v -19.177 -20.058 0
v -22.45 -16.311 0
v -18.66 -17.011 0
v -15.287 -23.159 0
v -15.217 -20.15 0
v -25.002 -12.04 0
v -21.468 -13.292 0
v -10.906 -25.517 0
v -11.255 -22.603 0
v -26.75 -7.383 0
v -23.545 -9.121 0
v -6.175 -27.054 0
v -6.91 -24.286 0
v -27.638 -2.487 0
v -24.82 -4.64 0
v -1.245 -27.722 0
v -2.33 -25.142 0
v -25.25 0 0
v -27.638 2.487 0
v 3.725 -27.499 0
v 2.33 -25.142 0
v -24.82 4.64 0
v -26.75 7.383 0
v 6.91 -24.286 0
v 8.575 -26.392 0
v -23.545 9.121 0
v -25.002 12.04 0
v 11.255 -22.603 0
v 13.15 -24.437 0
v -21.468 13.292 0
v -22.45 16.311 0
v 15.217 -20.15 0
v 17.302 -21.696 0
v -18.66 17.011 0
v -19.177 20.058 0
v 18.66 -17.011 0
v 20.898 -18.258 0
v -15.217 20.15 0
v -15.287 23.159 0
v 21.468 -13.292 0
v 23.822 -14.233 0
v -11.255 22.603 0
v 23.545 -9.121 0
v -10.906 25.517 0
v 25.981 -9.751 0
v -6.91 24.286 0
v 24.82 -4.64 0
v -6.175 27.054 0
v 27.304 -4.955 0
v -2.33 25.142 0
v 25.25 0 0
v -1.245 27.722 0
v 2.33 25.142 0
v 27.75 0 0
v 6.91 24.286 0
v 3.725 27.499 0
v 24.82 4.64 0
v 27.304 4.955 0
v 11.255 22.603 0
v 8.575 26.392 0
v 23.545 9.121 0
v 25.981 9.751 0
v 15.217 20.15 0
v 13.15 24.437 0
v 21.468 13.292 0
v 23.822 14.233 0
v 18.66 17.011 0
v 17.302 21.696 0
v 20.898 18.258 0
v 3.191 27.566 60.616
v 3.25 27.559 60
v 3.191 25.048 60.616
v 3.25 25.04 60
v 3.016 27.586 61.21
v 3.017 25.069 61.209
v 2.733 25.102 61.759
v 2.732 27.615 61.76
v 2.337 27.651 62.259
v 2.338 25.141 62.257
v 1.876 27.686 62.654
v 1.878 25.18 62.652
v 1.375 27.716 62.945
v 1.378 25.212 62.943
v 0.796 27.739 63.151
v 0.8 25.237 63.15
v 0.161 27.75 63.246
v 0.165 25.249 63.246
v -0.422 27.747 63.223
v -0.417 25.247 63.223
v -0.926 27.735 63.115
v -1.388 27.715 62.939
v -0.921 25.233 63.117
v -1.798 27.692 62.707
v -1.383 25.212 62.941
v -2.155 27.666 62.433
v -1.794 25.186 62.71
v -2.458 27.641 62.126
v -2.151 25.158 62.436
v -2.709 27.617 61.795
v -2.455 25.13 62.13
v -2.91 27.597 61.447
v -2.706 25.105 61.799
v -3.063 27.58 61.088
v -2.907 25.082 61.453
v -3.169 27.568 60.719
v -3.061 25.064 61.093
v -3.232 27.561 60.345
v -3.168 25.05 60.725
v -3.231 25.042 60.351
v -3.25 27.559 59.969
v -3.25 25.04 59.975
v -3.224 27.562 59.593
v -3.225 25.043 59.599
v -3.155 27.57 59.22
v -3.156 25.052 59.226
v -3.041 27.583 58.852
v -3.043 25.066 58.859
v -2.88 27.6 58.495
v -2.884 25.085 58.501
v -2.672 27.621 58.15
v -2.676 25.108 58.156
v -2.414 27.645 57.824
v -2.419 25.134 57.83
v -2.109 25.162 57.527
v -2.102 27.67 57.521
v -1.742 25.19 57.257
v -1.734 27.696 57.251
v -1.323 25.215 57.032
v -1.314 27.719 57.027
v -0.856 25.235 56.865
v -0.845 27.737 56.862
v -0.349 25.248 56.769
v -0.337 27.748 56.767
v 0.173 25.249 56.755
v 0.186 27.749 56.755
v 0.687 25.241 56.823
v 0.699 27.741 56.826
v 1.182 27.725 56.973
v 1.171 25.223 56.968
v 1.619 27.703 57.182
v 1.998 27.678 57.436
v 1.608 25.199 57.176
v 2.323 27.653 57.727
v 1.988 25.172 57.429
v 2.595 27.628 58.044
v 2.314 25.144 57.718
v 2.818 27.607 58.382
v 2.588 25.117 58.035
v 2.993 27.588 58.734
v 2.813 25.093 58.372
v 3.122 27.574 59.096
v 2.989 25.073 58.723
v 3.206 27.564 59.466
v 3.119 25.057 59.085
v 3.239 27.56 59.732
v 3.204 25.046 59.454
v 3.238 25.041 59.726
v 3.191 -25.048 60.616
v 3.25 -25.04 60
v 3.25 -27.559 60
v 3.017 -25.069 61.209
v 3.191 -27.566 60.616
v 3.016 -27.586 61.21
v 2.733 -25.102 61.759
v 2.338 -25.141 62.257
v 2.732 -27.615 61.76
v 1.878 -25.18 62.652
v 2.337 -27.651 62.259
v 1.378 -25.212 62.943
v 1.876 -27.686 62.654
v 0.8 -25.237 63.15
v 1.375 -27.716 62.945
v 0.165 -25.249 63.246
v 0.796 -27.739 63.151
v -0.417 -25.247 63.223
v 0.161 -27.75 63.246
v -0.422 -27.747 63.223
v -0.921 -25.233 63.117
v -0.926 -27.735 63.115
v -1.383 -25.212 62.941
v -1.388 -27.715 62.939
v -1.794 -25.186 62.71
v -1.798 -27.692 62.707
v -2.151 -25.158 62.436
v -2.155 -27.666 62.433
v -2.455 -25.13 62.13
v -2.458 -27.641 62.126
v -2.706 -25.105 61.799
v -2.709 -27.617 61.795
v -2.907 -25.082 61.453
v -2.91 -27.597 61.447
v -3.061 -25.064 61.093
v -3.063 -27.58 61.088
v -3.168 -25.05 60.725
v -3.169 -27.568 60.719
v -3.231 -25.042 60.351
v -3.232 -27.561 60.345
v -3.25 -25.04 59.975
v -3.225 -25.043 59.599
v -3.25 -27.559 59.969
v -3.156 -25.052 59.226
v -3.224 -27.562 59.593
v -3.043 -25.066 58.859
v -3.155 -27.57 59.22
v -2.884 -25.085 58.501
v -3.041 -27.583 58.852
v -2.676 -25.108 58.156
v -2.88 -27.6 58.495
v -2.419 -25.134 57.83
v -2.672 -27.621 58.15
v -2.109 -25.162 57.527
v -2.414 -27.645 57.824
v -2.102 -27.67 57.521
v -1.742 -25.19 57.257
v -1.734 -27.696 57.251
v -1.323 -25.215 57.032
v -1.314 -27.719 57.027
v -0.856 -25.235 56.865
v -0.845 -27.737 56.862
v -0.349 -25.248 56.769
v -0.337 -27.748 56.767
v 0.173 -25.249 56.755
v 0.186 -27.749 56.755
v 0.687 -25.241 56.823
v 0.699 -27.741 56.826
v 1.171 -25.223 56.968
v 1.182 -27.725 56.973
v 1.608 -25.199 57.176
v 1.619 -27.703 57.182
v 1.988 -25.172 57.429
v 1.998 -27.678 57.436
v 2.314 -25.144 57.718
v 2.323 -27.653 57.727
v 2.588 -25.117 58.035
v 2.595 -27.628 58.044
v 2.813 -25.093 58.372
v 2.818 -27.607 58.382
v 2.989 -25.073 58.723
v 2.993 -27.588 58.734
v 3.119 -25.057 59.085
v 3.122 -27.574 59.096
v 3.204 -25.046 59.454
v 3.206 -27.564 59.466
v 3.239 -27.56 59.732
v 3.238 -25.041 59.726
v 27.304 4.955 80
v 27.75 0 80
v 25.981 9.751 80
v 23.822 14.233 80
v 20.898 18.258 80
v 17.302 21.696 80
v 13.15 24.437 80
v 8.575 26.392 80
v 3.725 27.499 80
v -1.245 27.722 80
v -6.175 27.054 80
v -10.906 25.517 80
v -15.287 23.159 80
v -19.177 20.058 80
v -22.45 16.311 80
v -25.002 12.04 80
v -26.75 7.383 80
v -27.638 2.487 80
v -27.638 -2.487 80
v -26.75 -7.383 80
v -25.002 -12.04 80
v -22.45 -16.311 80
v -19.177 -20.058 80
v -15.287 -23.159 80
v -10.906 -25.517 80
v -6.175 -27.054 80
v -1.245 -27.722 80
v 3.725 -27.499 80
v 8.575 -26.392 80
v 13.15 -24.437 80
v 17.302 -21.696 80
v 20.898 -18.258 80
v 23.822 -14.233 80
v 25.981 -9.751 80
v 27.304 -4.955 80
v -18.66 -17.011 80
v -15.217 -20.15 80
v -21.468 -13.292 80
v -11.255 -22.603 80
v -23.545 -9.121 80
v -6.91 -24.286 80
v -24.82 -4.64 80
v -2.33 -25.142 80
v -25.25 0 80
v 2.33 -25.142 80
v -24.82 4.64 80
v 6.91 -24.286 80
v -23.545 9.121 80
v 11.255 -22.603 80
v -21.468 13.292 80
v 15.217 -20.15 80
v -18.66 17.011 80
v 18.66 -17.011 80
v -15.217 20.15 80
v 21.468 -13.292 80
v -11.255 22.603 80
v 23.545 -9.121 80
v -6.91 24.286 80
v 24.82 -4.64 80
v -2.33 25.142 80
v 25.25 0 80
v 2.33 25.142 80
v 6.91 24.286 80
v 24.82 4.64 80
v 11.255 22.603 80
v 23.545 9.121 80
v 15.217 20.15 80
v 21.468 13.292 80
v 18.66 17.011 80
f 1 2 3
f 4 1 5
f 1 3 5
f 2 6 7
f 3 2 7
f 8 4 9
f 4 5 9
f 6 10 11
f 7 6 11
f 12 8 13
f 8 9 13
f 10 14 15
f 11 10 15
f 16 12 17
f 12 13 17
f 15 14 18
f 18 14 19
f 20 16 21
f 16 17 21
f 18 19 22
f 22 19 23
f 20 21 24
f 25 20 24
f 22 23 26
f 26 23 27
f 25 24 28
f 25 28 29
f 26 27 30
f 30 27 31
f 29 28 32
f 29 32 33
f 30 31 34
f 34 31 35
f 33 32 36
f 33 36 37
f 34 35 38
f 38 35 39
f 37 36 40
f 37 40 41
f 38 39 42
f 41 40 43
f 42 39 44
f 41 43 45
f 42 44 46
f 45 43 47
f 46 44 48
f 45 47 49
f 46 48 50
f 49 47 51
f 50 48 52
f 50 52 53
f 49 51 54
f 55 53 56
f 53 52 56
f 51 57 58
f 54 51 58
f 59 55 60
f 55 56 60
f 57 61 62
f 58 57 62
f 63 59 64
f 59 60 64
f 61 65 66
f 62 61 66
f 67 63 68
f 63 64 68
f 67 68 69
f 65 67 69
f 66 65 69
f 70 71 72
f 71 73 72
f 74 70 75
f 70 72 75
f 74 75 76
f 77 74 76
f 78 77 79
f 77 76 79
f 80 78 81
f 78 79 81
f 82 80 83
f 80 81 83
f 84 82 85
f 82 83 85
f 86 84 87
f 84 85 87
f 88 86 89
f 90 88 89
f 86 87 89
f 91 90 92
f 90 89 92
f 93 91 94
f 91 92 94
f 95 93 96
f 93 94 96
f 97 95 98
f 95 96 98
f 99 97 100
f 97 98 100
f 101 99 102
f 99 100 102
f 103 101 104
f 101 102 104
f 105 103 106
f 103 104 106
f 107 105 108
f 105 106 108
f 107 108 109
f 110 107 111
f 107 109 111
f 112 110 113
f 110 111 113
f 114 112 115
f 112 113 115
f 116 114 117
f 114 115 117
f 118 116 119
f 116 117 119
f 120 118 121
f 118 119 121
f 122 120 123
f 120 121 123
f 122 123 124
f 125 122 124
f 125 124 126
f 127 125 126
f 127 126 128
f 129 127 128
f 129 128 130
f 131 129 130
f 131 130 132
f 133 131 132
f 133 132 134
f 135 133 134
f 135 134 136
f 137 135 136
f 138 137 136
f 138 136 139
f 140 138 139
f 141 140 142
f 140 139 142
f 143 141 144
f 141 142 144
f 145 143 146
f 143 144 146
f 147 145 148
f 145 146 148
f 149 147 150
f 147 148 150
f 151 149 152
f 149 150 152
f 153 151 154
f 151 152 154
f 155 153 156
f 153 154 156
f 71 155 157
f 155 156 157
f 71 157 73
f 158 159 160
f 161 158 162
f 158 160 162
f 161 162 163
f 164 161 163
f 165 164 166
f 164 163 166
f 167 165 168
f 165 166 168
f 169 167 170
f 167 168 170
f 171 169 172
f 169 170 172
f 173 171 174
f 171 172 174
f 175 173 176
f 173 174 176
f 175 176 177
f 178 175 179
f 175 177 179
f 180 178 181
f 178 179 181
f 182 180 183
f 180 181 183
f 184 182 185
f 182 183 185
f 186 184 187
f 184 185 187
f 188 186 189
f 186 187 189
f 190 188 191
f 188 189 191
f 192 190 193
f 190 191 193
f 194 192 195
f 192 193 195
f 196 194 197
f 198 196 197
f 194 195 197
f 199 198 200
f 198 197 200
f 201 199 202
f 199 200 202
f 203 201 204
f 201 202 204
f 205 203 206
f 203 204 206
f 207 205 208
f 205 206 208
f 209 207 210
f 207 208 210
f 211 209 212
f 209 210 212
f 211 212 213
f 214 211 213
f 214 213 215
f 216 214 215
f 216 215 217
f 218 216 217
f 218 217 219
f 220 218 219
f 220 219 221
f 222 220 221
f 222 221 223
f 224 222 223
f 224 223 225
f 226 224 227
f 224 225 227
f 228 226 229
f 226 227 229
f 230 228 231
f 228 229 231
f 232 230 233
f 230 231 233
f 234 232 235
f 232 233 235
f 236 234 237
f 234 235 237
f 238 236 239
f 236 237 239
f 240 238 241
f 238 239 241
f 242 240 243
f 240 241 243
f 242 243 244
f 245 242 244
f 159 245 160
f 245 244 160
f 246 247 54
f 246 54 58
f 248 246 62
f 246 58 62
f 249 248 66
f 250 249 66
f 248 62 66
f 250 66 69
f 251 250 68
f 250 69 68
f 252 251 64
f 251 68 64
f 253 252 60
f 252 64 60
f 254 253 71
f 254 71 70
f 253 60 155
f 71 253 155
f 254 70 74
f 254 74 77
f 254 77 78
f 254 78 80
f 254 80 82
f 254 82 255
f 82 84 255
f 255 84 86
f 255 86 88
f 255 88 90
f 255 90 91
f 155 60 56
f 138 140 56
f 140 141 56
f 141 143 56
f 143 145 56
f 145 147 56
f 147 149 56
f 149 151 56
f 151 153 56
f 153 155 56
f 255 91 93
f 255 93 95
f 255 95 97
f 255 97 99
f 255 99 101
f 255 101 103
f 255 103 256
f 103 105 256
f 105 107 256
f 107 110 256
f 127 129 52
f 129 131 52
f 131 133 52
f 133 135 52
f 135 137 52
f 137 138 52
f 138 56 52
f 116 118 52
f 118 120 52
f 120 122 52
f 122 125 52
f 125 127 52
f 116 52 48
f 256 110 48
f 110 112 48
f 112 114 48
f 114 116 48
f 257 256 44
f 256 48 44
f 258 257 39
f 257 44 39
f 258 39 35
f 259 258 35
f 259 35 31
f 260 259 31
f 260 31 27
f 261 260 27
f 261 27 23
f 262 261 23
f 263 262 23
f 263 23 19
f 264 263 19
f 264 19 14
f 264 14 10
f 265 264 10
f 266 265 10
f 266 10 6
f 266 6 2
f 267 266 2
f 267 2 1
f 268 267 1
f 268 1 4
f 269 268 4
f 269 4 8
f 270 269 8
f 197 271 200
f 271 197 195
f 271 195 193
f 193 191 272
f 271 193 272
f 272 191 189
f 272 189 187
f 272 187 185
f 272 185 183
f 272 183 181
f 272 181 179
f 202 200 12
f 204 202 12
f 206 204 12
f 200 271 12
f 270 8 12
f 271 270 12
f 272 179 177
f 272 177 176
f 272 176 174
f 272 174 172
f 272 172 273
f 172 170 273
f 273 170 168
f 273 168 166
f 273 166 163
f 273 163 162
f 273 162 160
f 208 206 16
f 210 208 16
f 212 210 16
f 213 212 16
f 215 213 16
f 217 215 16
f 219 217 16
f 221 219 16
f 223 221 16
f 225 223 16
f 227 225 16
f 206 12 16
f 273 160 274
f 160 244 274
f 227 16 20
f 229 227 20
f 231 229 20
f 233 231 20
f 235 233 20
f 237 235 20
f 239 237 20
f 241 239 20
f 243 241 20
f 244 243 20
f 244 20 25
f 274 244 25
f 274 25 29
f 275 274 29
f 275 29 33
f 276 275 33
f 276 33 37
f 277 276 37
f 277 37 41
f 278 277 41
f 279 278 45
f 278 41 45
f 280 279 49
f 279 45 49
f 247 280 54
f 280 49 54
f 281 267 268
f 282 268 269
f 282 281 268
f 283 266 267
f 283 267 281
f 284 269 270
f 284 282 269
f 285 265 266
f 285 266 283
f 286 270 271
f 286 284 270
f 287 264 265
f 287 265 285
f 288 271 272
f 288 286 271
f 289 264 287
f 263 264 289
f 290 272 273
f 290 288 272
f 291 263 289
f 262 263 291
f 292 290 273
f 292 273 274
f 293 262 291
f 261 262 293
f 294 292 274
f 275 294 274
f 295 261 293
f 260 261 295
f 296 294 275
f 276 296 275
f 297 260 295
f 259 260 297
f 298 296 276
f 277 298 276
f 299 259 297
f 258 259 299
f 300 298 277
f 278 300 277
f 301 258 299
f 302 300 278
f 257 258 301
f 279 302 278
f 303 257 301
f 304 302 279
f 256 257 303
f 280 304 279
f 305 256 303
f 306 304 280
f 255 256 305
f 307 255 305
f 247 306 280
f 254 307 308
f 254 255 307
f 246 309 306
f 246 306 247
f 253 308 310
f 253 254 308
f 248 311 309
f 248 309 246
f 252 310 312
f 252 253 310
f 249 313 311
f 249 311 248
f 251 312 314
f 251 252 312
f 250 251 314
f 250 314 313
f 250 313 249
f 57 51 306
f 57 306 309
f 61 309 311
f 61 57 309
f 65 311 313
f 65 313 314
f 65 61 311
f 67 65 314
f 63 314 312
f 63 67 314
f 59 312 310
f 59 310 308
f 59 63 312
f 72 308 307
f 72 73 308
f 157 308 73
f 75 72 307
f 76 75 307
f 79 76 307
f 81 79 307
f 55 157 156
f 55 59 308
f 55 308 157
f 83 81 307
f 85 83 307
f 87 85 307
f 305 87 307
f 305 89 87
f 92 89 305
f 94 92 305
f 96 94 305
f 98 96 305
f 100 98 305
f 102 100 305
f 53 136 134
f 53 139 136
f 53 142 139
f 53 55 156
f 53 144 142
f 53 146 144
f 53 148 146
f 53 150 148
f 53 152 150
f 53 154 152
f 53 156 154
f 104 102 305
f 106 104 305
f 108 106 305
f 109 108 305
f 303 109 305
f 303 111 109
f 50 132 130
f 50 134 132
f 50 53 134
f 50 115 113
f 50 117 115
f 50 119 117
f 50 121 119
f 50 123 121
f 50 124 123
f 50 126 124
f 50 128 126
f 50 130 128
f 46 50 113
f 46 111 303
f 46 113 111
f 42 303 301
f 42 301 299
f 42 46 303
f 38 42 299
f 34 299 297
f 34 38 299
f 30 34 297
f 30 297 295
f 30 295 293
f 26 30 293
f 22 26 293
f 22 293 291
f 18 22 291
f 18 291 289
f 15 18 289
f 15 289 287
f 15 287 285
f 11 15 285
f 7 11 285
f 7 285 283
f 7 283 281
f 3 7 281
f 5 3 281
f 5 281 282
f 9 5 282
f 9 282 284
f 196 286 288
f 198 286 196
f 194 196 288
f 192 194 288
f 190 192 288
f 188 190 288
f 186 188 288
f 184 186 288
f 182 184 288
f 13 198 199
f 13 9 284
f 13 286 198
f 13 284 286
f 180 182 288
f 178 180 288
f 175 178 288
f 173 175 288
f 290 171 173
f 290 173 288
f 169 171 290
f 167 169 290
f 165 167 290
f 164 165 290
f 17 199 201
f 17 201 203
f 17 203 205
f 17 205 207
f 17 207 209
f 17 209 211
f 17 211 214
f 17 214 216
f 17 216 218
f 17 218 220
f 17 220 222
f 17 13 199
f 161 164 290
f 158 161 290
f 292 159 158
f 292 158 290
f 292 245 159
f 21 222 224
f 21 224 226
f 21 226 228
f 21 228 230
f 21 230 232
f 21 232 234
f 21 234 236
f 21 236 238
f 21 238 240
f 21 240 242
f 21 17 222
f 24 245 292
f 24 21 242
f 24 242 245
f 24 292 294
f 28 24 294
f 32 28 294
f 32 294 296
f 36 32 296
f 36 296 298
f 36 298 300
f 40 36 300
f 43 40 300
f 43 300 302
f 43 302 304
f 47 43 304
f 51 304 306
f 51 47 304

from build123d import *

# Parameters (mm, degrees)
F0_R     = 27.75
F1_DEPTH = 80
F2_T     = -2.5
F3_R     = 3.25
F4_DEPTH = 30


with BuildPart() as f1:
    # F0 (on Top) → F1 (new body)
    with BuildSketch(Plane.XY):
        Circle(F0_R)
    extrude(amount=F1_DEPTH)

    # F2
    f2_openings = [f1.faces().sort_by_distance(p)[0] for p in [
        (0, 0, 80),
        (0, 0, 0),
    ]]
    offset(amount=F2_T, openings=f2_openings)

    # F3 (on Front) → F4 (cut, symmetric)
    with BuildSketch(Plane.XZ):
        with Locations((0, 60)):
            Circle(F3_R)
    extrude(amount=F4_DEPTH, both=True, mode=Mode.SUBTRACT)


solid = f1.part
